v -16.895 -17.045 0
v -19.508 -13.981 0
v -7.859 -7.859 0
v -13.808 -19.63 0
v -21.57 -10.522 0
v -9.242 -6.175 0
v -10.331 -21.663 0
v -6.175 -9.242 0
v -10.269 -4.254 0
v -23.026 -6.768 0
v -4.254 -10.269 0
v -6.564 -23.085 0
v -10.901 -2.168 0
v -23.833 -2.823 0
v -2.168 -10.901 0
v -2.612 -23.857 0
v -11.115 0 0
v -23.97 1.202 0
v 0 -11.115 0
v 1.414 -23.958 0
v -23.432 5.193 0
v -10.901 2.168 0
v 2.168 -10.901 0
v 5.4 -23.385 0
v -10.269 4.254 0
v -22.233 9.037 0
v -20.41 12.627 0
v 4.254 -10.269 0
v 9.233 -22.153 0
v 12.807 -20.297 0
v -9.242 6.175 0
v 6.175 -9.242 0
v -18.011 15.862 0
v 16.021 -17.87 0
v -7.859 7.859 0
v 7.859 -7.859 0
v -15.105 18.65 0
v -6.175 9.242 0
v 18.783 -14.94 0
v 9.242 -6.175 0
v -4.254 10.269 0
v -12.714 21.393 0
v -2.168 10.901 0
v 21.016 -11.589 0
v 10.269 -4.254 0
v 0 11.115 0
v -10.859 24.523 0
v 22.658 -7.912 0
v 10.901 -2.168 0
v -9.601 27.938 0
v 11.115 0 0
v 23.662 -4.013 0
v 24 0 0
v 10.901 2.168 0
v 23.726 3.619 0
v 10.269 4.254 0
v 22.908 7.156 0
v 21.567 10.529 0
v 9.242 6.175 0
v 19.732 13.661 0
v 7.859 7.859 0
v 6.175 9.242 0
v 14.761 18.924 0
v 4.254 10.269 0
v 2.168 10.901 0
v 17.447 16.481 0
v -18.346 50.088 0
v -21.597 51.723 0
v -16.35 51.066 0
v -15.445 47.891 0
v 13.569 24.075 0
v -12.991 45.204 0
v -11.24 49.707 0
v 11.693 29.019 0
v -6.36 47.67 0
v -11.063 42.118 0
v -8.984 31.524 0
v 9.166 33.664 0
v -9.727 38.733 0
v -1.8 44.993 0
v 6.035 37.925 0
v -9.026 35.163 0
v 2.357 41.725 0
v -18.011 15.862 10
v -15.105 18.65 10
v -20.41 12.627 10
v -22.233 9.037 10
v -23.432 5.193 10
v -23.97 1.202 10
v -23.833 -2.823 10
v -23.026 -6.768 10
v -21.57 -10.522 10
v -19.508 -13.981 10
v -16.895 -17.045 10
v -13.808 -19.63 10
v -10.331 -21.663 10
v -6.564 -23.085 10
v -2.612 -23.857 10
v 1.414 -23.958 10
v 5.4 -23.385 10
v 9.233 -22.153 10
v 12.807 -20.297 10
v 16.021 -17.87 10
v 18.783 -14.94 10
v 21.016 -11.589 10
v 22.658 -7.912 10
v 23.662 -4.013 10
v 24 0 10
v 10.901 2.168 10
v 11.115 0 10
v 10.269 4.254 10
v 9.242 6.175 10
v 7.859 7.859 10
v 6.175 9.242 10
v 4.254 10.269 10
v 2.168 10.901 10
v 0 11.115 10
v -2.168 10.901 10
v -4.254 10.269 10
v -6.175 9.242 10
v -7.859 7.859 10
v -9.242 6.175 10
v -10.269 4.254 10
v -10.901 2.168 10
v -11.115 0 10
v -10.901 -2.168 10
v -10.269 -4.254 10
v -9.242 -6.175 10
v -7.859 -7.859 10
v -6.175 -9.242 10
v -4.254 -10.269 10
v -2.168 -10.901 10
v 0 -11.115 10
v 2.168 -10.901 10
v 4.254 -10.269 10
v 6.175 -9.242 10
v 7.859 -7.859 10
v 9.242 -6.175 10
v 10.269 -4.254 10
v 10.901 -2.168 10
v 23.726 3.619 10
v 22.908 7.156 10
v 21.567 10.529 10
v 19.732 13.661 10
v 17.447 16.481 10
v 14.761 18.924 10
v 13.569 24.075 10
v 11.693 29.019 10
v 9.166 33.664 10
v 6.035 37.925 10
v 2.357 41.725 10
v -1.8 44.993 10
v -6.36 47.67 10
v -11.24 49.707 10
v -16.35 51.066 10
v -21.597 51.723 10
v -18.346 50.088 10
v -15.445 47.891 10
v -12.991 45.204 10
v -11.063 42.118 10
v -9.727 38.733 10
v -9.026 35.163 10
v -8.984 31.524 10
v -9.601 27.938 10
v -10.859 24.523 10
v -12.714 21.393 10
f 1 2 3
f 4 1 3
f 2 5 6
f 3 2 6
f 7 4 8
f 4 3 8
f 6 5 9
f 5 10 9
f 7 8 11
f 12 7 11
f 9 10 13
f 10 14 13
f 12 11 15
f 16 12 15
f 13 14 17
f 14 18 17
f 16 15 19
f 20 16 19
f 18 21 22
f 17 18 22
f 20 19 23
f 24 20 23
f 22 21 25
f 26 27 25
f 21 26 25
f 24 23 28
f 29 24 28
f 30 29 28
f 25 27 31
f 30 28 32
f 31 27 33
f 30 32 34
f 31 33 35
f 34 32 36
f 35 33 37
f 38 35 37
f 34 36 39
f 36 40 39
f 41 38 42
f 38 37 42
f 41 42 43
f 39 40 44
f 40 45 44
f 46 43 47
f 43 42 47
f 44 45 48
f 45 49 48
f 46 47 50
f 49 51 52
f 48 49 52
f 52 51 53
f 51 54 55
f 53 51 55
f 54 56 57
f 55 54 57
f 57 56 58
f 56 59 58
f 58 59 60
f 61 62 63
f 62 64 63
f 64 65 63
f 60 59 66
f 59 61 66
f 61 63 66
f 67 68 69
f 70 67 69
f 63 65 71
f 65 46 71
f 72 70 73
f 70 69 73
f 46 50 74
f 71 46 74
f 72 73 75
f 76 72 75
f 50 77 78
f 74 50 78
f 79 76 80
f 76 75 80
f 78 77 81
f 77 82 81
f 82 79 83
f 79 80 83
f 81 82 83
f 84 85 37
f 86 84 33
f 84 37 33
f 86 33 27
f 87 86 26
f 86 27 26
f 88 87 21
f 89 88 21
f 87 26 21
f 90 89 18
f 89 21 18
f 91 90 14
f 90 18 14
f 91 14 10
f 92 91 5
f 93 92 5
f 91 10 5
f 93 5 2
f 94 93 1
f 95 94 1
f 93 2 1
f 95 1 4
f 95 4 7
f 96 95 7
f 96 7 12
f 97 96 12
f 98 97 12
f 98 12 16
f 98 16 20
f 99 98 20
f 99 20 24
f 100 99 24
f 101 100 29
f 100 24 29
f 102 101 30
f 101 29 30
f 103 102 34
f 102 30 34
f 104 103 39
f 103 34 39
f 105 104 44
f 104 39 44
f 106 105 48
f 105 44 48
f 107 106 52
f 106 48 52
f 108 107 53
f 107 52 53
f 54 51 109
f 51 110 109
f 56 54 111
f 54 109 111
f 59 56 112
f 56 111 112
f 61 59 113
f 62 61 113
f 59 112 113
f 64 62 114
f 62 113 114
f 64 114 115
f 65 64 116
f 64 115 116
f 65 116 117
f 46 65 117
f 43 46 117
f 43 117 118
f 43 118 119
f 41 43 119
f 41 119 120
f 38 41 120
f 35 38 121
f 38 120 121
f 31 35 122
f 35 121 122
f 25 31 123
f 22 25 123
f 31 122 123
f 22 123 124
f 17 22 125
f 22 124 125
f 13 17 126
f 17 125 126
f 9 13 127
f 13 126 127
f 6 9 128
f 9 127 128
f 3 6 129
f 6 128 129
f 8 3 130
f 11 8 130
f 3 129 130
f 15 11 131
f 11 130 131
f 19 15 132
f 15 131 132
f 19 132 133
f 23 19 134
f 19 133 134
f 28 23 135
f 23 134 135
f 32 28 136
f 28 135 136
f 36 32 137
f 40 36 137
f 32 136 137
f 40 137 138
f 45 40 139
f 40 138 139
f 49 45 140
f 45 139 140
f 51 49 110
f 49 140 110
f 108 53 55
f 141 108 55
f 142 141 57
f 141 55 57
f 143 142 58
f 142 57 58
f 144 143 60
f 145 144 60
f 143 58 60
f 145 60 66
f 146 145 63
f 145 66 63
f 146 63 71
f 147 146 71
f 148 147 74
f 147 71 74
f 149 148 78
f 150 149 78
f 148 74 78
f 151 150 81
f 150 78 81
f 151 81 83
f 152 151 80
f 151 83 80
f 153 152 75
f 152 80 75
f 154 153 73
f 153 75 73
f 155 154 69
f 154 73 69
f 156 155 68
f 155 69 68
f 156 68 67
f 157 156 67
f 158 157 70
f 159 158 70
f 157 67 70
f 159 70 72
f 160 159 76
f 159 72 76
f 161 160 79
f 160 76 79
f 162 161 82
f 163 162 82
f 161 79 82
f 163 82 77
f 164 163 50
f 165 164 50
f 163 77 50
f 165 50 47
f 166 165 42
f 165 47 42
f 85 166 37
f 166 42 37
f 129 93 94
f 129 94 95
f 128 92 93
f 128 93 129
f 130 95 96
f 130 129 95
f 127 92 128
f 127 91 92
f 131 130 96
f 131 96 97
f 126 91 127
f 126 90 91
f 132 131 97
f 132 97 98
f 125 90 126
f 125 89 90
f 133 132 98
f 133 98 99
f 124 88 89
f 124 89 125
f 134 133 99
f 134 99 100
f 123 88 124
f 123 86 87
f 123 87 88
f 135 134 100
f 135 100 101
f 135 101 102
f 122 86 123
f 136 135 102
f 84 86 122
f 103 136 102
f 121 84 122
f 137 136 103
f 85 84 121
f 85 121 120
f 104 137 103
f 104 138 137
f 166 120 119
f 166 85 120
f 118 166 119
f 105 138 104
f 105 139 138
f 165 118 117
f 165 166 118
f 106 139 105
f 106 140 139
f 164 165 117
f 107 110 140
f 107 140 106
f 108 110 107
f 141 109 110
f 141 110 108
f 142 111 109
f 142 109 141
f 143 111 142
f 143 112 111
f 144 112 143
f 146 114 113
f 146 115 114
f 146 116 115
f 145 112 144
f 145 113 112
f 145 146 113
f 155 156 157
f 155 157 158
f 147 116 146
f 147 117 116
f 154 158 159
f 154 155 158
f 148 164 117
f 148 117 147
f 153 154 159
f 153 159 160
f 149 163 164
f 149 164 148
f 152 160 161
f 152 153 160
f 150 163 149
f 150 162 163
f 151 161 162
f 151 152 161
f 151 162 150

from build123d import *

# Parameters (mm, degrees)
F2_DEPTH = 10
F0_R     = 11.115
F3_DEPTH = 12.5


with BuildPart() as f2:
    # F1 (on Top) → F2 (new body)
    with BuildSketch(Plane.XY):
        with BuildLine():
            ThreePointArc((-15.105416, 18.650104), (-0.219685, 23.998995), (14.76147, 18.923504))
            ThreePointArc((14.76147, 18.923504), (2.357081, 41.724676), (-21.59713, 51.722581))
            ThreePointArc((-21.59713, 51.722581), (-9.295213, 36.963934), (-15.105416, 18.650104))
        make_face()
        with BuildLine():
            ThreePointArc((-15.105416, 18.650104), (-10.331263, -21.662525), (24, 0))
            ThreePointArc((24, 0), (21.56705, 10.529119), (14.76147, 18.923504))
            ThreePointArc((14.76147, 18.923504), (-0.219685, 23.998995), (-15.105416, 18.650104))
        make_face()
    extrude(amount=F2_DEPTH)

    # F0 (on Top) → F3 (cut, symmetric)
    with BuildSketch(Plane.XY):
        Circle(F0_R)
    extrude(amount=F3_DEPTH, both=True, mode=Mode.SUBTRACT)


solid = f2.part
